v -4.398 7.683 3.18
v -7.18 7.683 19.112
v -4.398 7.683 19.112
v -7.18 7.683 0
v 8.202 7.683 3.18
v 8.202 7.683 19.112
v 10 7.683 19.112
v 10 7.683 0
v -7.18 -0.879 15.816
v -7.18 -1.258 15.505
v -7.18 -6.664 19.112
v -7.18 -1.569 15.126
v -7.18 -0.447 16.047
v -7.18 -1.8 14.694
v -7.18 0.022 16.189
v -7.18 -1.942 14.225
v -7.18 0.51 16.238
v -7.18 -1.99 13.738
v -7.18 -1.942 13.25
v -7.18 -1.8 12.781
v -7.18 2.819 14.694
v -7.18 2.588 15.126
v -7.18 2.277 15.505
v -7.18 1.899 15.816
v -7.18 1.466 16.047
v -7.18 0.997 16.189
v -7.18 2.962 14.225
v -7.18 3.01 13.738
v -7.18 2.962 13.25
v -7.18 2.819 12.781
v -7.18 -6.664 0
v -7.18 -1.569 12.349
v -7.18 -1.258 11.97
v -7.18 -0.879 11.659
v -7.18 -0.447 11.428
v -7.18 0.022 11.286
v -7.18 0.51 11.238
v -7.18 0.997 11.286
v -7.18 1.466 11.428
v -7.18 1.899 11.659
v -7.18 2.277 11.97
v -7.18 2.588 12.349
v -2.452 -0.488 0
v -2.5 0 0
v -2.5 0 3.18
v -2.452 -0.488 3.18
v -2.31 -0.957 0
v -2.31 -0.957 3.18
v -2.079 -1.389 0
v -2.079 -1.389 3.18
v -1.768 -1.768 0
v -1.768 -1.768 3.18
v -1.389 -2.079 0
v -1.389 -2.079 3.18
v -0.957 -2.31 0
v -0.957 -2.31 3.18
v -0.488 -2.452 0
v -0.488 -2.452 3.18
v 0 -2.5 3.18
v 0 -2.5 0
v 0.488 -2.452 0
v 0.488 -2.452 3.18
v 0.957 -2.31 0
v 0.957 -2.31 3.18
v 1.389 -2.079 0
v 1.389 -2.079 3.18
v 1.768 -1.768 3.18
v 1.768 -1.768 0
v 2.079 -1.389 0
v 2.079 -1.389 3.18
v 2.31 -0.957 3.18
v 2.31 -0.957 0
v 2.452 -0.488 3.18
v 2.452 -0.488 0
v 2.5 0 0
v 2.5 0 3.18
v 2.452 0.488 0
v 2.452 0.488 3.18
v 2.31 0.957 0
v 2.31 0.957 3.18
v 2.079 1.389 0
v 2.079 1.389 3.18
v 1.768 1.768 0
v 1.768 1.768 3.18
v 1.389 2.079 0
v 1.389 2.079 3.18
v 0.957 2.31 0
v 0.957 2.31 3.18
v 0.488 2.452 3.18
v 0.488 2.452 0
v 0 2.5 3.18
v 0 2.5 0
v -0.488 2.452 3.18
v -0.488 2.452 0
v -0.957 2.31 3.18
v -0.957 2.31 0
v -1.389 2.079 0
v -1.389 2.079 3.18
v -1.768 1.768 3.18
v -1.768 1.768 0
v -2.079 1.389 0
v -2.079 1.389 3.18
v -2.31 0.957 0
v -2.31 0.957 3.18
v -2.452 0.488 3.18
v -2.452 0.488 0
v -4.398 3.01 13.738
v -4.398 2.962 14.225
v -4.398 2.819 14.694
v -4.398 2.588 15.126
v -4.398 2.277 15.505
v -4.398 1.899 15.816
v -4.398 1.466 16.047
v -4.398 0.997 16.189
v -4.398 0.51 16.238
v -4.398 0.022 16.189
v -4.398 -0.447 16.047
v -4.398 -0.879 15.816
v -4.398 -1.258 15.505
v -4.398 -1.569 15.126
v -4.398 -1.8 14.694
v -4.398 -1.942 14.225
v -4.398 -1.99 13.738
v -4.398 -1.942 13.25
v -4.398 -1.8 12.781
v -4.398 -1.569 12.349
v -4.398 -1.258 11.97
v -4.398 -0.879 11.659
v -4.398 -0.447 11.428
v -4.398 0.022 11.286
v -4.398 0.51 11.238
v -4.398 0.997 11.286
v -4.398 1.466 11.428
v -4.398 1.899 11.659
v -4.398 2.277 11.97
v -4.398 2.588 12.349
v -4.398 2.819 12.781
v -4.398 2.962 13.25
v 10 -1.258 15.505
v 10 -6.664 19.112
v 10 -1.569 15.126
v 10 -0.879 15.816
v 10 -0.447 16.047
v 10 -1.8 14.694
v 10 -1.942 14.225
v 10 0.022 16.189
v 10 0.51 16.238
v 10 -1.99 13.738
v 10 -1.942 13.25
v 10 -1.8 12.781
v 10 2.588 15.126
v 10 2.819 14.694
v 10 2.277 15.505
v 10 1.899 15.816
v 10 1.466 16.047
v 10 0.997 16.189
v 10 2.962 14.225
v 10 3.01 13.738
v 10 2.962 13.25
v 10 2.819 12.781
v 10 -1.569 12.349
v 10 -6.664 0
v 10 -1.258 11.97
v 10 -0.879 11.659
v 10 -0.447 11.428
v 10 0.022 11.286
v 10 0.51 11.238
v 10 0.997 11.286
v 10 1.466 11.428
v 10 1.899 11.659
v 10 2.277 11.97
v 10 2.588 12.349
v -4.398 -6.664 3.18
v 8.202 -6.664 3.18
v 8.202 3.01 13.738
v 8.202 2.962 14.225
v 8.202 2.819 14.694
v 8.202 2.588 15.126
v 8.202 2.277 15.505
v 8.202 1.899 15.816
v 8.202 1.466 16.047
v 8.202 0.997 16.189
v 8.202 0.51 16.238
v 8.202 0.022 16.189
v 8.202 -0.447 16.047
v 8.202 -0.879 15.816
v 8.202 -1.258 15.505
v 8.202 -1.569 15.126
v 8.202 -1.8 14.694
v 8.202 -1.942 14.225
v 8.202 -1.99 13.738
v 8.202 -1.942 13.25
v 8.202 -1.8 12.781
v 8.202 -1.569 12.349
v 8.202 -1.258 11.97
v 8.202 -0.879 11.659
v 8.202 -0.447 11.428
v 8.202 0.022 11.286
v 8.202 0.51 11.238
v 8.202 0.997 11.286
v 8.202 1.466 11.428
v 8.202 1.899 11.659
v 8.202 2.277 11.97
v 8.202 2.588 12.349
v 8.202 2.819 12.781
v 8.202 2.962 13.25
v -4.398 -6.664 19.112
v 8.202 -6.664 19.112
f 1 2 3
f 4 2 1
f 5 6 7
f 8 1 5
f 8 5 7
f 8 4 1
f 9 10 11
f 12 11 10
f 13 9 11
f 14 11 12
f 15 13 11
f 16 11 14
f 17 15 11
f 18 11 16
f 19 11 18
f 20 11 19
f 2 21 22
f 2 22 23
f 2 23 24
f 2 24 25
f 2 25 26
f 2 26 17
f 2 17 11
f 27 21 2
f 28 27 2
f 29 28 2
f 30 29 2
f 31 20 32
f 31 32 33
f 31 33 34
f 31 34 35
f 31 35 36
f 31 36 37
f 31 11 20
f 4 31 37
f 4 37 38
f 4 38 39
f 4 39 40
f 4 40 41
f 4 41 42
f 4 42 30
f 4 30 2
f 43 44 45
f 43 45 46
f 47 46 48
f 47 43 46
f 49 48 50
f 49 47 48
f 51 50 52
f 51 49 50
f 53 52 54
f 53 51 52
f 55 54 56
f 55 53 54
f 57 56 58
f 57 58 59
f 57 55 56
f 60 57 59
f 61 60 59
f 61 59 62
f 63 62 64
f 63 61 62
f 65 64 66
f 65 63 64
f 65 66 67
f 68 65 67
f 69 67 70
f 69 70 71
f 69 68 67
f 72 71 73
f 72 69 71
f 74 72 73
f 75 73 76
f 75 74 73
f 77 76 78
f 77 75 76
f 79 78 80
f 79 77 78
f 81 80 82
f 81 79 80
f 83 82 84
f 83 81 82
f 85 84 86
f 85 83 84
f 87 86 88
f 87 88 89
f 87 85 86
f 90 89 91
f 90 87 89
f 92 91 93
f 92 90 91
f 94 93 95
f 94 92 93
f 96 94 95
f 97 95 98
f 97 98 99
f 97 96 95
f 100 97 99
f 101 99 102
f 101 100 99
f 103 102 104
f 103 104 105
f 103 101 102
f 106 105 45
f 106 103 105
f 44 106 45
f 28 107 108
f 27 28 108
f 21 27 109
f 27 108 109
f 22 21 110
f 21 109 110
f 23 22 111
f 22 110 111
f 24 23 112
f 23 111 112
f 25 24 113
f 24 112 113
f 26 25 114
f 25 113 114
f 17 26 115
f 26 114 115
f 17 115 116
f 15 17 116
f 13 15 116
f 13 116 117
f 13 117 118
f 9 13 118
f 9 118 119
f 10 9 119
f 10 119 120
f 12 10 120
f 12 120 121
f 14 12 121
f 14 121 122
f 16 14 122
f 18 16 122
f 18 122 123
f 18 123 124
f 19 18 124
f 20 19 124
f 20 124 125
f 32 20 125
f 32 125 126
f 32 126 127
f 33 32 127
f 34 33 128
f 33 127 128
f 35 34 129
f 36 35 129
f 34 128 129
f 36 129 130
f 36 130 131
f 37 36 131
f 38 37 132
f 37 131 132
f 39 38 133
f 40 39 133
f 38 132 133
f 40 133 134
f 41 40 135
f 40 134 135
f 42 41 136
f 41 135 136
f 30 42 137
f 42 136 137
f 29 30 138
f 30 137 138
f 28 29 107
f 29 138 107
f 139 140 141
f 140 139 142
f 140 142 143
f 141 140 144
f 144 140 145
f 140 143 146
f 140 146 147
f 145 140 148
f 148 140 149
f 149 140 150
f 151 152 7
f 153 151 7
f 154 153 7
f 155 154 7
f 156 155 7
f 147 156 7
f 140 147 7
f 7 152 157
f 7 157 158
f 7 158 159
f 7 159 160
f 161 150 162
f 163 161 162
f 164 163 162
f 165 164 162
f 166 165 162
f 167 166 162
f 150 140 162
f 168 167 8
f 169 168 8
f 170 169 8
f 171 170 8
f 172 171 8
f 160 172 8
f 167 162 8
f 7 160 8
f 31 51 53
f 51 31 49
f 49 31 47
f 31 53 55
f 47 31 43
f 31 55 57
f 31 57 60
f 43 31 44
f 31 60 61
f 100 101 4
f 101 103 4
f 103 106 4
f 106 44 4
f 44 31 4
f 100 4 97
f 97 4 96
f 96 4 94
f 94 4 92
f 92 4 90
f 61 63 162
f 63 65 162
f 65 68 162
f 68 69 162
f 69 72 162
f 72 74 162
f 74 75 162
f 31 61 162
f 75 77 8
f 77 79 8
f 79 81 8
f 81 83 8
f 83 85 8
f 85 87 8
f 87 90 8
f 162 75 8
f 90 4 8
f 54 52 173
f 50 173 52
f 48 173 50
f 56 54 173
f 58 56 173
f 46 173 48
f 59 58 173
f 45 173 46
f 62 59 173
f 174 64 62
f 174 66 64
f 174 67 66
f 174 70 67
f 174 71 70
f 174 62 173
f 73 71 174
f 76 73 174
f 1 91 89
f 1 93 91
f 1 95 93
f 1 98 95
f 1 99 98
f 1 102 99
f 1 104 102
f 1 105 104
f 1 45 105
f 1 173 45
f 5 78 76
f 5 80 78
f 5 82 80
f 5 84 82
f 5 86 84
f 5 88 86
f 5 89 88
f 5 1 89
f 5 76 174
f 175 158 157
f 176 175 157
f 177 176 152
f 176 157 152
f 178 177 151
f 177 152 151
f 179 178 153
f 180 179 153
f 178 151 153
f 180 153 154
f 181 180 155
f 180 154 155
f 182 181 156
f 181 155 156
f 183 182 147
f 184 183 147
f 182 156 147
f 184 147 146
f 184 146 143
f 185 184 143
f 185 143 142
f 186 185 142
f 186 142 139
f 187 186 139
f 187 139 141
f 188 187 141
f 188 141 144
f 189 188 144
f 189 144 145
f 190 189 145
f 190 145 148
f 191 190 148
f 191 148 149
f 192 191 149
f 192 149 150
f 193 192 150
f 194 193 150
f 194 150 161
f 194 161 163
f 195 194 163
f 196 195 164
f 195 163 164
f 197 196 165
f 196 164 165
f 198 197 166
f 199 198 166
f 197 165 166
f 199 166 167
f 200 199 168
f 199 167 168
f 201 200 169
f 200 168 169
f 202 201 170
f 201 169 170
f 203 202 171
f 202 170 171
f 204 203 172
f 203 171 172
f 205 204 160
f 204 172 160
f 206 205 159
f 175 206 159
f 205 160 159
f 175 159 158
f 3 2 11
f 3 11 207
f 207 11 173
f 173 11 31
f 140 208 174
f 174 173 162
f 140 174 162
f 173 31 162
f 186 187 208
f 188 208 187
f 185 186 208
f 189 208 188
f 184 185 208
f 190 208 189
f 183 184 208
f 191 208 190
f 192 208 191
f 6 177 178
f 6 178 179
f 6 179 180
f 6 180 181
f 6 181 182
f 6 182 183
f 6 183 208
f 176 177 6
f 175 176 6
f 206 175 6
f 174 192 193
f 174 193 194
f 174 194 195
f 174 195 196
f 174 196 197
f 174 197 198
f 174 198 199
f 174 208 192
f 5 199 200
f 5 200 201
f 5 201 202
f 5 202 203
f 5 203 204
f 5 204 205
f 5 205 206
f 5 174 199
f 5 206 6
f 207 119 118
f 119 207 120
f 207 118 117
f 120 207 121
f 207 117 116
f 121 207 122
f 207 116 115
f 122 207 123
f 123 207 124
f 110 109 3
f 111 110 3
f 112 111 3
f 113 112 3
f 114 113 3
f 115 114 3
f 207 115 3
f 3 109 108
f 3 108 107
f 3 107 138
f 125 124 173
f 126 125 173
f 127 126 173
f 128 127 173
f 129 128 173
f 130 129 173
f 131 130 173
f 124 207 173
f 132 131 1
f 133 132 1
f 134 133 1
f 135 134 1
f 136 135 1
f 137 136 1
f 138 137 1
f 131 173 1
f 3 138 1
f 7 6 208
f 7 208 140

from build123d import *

# Parameters (mm, degrees)
SKETCH1_W           = 17.180000002
SKETCH1_H           = 14.347137423
SKETCH1_R           = 2.5
BOSS_EXTRUDE1_DEPTH = 3.18
SKETCH2_W           = 1.798380988
SKETCH2_H           = 14.347137423
SKETCH2_W_2         = 2.781619014
BOSS_EXTRUDE2_DEPTH = 15.932476
SKETCH3_R           = 2.5
CUT_EXTRUDE1_DEPTH  = 27.822965215


with BuildPart() as part:
    # Sketch1 → Boss-Extrude1 (new body)
    with BuildSketch(Plane.XY):
        with Locations((1.409999999, 0.509680861)):
            Rectangle(SKETCH1_W, SKETCH1_H)
        with Locations(Location((0, 0, 0), (0, 0, 180))):
            Circle(SKETCH1_R, mode=Mode.SUBTRACT)
    extrude(amount=BOSS_EXTRUDE1_DEPTH)

    # Sketch2 → Boss-Extrude2 (add)
    with BuildSketch(Plane.XY.offset(3.18)):
        with Locations((9.100809506, 0.509680861)):
            Rectangle(SKETCH2_W, SKETCH2_H)
        with Locations((-5.789190495, 0.509680861)):
            Rectangle(SKETCH2_W_2, SKETCH2_H)
    extrude(amount=BOSS_EXTRUDE2_DEPTH)

    # Sketch3 → Cut-Extrude1 (cut, through all)
    with BuildSketch(Plane(origin=(10, 0, 0), x_dir=(0, 0, -1), z_dir=(1, 0, 0))):
        with Locations(Location((-13.737500001, 0.50968086, 0), (0, 0, 90))):
            Circle(SKETCH3_R)
    extrude(amount=-CUT_EXTRUDE1_DEPTH, mode=Mode.SUBTRACT)


solid = part.part
